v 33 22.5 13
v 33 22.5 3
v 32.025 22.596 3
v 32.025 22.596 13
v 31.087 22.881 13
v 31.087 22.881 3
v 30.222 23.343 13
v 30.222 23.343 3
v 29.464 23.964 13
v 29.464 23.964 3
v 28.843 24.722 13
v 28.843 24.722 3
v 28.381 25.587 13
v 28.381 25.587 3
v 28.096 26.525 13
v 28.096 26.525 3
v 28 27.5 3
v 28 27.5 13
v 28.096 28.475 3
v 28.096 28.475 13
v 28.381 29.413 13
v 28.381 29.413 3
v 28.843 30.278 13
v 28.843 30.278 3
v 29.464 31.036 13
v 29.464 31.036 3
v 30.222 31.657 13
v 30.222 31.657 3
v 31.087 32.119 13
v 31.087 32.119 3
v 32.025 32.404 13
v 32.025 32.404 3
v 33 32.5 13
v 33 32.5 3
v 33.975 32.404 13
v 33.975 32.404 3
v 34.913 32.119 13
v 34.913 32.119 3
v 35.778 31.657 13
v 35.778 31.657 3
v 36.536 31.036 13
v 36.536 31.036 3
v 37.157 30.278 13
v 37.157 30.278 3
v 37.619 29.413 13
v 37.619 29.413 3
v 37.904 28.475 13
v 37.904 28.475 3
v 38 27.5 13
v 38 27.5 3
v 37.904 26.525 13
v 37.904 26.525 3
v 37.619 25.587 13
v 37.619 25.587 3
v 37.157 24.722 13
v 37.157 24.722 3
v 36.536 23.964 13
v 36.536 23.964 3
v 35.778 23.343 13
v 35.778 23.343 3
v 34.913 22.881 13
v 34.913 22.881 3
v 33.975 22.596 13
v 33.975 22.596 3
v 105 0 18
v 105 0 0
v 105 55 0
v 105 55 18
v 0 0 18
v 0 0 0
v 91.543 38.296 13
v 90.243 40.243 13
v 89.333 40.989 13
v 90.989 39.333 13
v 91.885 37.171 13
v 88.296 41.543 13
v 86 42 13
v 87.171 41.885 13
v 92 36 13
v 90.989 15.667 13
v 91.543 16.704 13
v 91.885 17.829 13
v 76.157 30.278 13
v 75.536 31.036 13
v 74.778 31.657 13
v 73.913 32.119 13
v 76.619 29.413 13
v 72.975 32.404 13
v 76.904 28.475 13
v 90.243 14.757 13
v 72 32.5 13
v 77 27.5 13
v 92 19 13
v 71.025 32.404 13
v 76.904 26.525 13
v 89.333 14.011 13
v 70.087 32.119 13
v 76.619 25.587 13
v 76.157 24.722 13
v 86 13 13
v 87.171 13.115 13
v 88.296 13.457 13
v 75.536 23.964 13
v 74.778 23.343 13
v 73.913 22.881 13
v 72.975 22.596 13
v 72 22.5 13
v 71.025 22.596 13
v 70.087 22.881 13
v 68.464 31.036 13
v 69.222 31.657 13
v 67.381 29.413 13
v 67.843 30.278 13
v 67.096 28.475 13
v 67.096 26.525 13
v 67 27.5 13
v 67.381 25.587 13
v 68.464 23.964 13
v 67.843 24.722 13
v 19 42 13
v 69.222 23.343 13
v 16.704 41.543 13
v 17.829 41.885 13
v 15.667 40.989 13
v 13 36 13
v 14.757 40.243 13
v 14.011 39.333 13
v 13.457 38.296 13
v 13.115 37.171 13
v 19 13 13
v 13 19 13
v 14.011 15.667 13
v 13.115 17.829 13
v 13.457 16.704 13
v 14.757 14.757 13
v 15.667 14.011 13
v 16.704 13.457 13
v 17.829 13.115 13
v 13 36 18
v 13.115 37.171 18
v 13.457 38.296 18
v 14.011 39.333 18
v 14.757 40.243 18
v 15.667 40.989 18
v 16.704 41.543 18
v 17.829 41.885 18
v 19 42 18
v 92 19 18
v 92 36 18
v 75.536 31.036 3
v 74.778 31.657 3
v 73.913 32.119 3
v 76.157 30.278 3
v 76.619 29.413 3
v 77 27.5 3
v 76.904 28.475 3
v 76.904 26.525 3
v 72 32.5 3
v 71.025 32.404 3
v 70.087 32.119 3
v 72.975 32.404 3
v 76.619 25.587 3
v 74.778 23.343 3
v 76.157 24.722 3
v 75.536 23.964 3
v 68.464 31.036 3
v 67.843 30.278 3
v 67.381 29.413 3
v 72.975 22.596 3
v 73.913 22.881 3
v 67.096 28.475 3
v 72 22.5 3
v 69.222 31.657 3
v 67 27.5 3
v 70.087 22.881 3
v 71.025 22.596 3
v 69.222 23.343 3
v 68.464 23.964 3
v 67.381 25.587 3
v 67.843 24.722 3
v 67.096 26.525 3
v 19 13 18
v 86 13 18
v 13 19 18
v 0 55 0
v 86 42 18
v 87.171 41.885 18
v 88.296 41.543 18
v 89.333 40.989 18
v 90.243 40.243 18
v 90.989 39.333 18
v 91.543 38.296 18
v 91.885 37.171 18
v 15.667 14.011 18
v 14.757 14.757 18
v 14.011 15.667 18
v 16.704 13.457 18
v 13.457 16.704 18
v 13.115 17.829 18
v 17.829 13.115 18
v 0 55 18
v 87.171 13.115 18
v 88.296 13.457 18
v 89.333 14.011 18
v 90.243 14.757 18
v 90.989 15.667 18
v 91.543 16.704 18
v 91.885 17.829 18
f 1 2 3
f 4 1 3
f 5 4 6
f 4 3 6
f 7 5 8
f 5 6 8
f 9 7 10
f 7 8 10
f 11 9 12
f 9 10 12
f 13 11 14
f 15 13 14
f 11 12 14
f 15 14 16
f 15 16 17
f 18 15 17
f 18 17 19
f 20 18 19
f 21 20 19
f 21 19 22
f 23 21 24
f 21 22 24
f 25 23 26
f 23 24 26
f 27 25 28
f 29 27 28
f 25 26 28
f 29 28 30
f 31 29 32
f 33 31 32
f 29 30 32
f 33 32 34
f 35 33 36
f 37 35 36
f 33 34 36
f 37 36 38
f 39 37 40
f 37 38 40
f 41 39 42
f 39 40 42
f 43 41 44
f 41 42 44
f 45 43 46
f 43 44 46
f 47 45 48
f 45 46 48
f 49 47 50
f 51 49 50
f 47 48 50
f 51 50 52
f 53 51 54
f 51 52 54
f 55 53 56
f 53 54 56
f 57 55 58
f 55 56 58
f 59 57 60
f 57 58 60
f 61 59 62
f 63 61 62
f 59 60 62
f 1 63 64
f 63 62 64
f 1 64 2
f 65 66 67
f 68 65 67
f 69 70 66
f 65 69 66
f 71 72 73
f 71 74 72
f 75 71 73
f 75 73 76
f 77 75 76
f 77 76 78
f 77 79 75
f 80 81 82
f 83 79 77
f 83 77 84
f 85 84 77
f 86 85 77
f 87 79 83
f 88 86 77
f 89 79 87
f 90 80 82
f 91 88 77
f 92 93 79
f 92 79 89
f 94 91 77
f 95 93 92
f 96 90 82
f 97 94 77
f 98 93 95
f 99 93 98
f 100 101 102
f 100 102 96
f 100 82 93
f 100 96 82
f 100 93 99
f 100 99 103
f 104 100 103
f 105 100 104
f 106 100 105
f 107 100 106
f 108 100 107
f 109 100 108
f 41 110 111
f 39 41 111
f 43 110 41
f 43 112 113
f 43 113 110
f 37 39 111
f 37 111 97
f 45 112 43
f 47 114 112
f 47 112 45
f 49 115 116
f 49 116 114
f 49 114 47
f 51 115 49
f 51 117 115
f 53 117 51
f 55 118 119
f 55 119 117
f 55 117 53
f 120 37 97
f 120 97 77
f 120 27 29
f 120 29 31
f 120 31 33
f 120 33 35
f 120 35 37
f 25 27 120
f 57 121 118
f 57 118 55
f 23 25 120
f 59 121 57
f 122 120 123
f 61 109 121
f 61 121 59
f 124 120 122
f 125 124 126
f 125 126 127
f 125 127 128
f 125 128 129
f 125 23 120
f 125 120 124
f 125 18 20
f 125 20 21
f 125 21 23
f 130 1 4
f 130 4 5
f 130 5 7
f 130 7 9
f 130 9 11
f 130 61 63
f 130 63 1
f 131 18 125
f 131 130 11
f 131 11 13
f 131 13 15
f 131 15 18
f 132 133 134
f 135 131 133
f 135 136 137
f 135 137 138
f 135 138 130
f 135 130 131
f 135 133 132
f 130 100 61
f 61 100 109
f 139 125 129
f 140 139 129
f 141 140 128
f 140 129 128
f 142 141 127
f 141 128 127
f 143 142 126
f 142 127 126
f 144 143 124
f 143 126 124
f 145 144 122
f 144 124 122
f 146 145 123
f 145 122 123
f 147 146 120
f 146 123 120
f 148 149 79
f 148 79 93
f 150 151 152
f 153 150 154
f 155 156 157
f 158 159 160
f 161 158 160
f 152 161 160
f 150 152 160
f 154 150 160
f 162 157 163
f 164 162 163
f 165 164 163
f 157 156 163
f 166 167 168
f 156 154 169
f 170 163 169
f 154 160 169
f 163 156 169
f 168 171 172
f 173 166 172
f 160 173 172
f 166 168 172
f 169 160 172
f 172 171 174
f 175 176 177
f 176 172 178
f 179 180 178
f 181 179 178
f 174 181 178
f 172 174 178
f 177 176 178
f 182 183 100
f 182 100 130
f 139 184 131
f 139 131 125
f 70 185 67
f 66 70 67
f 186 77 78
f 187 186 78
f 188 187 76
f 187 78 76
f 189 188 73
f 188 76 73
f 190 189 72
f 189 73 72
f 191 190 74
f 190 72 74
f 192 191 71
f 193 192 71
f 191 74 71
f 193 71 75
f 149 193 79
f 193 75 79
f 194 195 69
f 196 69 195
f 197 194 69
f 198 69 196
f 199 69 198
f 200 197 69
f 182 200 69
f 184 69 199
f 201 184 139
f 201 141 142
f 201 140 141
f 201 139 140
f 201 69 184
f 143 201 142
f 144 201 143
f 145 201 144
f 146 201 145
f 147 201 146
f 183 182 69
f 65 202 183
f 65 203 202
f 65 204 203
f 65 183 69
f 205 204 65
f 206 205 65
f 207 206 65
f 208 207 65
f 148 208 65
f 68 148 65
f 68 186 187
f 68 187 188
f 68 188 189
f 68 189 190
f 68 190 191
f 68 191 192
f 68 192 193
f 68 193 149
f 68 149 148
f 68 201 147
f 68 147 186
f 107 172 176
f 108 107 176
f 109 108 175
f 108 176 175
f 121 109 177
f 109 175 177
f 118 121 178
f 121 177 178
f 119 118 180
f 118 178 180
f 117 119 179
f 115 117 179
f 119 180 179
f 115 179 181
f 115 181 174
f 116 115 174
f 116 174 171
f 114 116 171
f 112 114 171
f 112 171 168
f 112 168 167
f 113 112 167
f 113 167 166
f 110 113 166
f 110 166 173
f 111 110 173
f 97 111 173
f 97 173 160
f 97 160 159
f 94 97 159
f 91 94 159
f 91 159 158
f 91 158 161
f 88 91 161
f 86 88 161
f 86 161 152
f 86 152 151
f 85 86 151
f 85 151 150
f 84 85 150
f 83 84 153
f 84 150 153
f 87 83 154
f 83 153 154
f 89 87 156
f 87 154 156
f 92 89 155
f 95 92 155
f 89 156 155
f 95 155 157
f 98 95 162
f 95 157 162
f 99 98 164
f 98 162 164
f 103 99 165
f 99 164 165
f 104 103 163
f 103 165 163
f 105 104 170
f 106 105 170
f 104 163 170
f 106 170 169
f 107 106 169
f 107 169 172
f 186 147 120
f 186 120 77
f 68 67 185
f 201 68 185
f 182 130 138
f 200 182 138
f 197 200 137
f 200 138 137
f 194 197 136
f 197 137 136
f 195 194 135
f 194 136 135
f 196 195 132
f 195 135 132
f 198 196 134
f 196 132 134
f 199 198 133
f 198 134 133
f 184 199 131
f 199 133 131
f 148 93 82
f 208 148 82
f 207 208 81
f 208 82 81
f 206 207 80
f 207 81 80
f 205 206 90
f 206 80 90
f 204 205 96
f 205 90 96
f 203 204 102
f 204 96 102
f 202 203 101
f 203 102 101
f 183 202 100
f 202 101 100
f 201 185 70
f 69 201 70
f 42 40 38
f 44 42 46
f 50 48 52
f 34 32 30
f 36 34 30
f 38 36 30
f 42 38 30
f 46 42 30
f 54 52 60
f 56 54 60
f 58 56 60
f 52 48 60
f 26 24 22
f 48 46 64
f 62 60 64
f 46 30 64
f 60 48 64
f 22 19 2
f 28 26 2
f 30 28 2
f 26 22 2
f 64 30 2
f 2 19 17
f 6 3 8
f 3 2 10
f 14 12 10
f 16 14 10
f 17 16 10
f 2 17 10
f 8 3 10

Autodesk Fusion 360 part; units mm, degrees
sketch "Sketch1" plane through (0, 0, 0) normal (0, 0, 1) x (1, 0, 0)
  line L0 (0, 0) -> (105, 0)
  line L1 (105, 0) -> (105, 55)
  line L2 (105, 55) -> (0, 55)
  line L3 (0, 55) -> (0, 0)
  dimension "d1" = 105
  dimension "d2" = 55
extrude "Extrude1" add sketch "Sketch1" along normal blind 18
sketch "Sketch2" plane through (0, 0, 18) normal (0, 0, 1) x (-1, 0, 0)
  line L0 (0, -55) -> (0, 0)
  line L1 (0, 0) -> (-105, 0)
  line L2 (-105, 0) -> (-105, -55)
  line L3 (-105, -55) -> (0, -55)
  line L4 (0, -55) -> (-105, 0) construction
  line L5 (-105, -55) -> (0, 0) construction
  line L6 (-52.5, -27.5) -> (-52.5, -42) construction
  line L7 (-52.5, -42) -> (-92, -42)
  line L8 (-92, -42) -> (-92, -13)
  line L9 (-92, -13) -> (-13, -13)
  line L10 (-13, -13) -> (-13, -42)
  line L11 (-13, -42) -> (-52.5, -42)
  dimension "d5" = 29
  dimension "d6" = 79
  dimension "d7" = 14.5
  dimension "d8" = 39.5
extrude "Extrude2" cut sketch "Sketch2" against normal blind 5 contours L7 L8 L9 L10 L11
fillet "Fillet1" radius 6 4 edges at (13, 42, 15.5) (92, 42, 15.5) (92, 13, 15.5) (13, 13, 15.5)
sketch "Sketch3" plane through (0, 0, 13) normal (0, 0, 1) x (-1, 0, 0)
  arc A0 (-13, -19) -> (-19, -13) centre (-19, -19) ccw
  line L0 (-19, -13) -> (-86, -13)
  arc A1 (-86, -13) -> (-92, -19) centre (-86, -19) ccw
  line L1 (-92, -19) -> (-92, -36)
  arc A2 (-92, -36) -> (-86, -42) centre (-86, -36) ccw
  line L2 (-86, -42) -> (-19, -42)
  arc A3 (-19, -42) -> (-13, -36) centre (-19, -36) ccw
  line L3 (-13, -36) -> (-13, -19)
  line L4 (0, -55) -> (-105, 0) construction
  line L5 (-105, 0) -> (-105, -55) construction
  line L6 (-105, -55) -> (0, 0) construction
  line L7 (-52.5, -27.5) -> (-33, -27.5) construction
  line L8 (-52.5, -27.5) -> (-72, -27.5) construction
  dimension "d13" = 19.5
  dimension "d14" = 19.5
hole "Hole1" at (0, 0, 0) at (72, 27.5, 13) at (33, 27.5, 13) direction (0, 0, -1) diameter 10 depth 10 tip angle 180
equation "d7 = ( 29 / 2 ) * 1 mm"
equation "d8 = ( 79 / 2 ) * 1 mm"
